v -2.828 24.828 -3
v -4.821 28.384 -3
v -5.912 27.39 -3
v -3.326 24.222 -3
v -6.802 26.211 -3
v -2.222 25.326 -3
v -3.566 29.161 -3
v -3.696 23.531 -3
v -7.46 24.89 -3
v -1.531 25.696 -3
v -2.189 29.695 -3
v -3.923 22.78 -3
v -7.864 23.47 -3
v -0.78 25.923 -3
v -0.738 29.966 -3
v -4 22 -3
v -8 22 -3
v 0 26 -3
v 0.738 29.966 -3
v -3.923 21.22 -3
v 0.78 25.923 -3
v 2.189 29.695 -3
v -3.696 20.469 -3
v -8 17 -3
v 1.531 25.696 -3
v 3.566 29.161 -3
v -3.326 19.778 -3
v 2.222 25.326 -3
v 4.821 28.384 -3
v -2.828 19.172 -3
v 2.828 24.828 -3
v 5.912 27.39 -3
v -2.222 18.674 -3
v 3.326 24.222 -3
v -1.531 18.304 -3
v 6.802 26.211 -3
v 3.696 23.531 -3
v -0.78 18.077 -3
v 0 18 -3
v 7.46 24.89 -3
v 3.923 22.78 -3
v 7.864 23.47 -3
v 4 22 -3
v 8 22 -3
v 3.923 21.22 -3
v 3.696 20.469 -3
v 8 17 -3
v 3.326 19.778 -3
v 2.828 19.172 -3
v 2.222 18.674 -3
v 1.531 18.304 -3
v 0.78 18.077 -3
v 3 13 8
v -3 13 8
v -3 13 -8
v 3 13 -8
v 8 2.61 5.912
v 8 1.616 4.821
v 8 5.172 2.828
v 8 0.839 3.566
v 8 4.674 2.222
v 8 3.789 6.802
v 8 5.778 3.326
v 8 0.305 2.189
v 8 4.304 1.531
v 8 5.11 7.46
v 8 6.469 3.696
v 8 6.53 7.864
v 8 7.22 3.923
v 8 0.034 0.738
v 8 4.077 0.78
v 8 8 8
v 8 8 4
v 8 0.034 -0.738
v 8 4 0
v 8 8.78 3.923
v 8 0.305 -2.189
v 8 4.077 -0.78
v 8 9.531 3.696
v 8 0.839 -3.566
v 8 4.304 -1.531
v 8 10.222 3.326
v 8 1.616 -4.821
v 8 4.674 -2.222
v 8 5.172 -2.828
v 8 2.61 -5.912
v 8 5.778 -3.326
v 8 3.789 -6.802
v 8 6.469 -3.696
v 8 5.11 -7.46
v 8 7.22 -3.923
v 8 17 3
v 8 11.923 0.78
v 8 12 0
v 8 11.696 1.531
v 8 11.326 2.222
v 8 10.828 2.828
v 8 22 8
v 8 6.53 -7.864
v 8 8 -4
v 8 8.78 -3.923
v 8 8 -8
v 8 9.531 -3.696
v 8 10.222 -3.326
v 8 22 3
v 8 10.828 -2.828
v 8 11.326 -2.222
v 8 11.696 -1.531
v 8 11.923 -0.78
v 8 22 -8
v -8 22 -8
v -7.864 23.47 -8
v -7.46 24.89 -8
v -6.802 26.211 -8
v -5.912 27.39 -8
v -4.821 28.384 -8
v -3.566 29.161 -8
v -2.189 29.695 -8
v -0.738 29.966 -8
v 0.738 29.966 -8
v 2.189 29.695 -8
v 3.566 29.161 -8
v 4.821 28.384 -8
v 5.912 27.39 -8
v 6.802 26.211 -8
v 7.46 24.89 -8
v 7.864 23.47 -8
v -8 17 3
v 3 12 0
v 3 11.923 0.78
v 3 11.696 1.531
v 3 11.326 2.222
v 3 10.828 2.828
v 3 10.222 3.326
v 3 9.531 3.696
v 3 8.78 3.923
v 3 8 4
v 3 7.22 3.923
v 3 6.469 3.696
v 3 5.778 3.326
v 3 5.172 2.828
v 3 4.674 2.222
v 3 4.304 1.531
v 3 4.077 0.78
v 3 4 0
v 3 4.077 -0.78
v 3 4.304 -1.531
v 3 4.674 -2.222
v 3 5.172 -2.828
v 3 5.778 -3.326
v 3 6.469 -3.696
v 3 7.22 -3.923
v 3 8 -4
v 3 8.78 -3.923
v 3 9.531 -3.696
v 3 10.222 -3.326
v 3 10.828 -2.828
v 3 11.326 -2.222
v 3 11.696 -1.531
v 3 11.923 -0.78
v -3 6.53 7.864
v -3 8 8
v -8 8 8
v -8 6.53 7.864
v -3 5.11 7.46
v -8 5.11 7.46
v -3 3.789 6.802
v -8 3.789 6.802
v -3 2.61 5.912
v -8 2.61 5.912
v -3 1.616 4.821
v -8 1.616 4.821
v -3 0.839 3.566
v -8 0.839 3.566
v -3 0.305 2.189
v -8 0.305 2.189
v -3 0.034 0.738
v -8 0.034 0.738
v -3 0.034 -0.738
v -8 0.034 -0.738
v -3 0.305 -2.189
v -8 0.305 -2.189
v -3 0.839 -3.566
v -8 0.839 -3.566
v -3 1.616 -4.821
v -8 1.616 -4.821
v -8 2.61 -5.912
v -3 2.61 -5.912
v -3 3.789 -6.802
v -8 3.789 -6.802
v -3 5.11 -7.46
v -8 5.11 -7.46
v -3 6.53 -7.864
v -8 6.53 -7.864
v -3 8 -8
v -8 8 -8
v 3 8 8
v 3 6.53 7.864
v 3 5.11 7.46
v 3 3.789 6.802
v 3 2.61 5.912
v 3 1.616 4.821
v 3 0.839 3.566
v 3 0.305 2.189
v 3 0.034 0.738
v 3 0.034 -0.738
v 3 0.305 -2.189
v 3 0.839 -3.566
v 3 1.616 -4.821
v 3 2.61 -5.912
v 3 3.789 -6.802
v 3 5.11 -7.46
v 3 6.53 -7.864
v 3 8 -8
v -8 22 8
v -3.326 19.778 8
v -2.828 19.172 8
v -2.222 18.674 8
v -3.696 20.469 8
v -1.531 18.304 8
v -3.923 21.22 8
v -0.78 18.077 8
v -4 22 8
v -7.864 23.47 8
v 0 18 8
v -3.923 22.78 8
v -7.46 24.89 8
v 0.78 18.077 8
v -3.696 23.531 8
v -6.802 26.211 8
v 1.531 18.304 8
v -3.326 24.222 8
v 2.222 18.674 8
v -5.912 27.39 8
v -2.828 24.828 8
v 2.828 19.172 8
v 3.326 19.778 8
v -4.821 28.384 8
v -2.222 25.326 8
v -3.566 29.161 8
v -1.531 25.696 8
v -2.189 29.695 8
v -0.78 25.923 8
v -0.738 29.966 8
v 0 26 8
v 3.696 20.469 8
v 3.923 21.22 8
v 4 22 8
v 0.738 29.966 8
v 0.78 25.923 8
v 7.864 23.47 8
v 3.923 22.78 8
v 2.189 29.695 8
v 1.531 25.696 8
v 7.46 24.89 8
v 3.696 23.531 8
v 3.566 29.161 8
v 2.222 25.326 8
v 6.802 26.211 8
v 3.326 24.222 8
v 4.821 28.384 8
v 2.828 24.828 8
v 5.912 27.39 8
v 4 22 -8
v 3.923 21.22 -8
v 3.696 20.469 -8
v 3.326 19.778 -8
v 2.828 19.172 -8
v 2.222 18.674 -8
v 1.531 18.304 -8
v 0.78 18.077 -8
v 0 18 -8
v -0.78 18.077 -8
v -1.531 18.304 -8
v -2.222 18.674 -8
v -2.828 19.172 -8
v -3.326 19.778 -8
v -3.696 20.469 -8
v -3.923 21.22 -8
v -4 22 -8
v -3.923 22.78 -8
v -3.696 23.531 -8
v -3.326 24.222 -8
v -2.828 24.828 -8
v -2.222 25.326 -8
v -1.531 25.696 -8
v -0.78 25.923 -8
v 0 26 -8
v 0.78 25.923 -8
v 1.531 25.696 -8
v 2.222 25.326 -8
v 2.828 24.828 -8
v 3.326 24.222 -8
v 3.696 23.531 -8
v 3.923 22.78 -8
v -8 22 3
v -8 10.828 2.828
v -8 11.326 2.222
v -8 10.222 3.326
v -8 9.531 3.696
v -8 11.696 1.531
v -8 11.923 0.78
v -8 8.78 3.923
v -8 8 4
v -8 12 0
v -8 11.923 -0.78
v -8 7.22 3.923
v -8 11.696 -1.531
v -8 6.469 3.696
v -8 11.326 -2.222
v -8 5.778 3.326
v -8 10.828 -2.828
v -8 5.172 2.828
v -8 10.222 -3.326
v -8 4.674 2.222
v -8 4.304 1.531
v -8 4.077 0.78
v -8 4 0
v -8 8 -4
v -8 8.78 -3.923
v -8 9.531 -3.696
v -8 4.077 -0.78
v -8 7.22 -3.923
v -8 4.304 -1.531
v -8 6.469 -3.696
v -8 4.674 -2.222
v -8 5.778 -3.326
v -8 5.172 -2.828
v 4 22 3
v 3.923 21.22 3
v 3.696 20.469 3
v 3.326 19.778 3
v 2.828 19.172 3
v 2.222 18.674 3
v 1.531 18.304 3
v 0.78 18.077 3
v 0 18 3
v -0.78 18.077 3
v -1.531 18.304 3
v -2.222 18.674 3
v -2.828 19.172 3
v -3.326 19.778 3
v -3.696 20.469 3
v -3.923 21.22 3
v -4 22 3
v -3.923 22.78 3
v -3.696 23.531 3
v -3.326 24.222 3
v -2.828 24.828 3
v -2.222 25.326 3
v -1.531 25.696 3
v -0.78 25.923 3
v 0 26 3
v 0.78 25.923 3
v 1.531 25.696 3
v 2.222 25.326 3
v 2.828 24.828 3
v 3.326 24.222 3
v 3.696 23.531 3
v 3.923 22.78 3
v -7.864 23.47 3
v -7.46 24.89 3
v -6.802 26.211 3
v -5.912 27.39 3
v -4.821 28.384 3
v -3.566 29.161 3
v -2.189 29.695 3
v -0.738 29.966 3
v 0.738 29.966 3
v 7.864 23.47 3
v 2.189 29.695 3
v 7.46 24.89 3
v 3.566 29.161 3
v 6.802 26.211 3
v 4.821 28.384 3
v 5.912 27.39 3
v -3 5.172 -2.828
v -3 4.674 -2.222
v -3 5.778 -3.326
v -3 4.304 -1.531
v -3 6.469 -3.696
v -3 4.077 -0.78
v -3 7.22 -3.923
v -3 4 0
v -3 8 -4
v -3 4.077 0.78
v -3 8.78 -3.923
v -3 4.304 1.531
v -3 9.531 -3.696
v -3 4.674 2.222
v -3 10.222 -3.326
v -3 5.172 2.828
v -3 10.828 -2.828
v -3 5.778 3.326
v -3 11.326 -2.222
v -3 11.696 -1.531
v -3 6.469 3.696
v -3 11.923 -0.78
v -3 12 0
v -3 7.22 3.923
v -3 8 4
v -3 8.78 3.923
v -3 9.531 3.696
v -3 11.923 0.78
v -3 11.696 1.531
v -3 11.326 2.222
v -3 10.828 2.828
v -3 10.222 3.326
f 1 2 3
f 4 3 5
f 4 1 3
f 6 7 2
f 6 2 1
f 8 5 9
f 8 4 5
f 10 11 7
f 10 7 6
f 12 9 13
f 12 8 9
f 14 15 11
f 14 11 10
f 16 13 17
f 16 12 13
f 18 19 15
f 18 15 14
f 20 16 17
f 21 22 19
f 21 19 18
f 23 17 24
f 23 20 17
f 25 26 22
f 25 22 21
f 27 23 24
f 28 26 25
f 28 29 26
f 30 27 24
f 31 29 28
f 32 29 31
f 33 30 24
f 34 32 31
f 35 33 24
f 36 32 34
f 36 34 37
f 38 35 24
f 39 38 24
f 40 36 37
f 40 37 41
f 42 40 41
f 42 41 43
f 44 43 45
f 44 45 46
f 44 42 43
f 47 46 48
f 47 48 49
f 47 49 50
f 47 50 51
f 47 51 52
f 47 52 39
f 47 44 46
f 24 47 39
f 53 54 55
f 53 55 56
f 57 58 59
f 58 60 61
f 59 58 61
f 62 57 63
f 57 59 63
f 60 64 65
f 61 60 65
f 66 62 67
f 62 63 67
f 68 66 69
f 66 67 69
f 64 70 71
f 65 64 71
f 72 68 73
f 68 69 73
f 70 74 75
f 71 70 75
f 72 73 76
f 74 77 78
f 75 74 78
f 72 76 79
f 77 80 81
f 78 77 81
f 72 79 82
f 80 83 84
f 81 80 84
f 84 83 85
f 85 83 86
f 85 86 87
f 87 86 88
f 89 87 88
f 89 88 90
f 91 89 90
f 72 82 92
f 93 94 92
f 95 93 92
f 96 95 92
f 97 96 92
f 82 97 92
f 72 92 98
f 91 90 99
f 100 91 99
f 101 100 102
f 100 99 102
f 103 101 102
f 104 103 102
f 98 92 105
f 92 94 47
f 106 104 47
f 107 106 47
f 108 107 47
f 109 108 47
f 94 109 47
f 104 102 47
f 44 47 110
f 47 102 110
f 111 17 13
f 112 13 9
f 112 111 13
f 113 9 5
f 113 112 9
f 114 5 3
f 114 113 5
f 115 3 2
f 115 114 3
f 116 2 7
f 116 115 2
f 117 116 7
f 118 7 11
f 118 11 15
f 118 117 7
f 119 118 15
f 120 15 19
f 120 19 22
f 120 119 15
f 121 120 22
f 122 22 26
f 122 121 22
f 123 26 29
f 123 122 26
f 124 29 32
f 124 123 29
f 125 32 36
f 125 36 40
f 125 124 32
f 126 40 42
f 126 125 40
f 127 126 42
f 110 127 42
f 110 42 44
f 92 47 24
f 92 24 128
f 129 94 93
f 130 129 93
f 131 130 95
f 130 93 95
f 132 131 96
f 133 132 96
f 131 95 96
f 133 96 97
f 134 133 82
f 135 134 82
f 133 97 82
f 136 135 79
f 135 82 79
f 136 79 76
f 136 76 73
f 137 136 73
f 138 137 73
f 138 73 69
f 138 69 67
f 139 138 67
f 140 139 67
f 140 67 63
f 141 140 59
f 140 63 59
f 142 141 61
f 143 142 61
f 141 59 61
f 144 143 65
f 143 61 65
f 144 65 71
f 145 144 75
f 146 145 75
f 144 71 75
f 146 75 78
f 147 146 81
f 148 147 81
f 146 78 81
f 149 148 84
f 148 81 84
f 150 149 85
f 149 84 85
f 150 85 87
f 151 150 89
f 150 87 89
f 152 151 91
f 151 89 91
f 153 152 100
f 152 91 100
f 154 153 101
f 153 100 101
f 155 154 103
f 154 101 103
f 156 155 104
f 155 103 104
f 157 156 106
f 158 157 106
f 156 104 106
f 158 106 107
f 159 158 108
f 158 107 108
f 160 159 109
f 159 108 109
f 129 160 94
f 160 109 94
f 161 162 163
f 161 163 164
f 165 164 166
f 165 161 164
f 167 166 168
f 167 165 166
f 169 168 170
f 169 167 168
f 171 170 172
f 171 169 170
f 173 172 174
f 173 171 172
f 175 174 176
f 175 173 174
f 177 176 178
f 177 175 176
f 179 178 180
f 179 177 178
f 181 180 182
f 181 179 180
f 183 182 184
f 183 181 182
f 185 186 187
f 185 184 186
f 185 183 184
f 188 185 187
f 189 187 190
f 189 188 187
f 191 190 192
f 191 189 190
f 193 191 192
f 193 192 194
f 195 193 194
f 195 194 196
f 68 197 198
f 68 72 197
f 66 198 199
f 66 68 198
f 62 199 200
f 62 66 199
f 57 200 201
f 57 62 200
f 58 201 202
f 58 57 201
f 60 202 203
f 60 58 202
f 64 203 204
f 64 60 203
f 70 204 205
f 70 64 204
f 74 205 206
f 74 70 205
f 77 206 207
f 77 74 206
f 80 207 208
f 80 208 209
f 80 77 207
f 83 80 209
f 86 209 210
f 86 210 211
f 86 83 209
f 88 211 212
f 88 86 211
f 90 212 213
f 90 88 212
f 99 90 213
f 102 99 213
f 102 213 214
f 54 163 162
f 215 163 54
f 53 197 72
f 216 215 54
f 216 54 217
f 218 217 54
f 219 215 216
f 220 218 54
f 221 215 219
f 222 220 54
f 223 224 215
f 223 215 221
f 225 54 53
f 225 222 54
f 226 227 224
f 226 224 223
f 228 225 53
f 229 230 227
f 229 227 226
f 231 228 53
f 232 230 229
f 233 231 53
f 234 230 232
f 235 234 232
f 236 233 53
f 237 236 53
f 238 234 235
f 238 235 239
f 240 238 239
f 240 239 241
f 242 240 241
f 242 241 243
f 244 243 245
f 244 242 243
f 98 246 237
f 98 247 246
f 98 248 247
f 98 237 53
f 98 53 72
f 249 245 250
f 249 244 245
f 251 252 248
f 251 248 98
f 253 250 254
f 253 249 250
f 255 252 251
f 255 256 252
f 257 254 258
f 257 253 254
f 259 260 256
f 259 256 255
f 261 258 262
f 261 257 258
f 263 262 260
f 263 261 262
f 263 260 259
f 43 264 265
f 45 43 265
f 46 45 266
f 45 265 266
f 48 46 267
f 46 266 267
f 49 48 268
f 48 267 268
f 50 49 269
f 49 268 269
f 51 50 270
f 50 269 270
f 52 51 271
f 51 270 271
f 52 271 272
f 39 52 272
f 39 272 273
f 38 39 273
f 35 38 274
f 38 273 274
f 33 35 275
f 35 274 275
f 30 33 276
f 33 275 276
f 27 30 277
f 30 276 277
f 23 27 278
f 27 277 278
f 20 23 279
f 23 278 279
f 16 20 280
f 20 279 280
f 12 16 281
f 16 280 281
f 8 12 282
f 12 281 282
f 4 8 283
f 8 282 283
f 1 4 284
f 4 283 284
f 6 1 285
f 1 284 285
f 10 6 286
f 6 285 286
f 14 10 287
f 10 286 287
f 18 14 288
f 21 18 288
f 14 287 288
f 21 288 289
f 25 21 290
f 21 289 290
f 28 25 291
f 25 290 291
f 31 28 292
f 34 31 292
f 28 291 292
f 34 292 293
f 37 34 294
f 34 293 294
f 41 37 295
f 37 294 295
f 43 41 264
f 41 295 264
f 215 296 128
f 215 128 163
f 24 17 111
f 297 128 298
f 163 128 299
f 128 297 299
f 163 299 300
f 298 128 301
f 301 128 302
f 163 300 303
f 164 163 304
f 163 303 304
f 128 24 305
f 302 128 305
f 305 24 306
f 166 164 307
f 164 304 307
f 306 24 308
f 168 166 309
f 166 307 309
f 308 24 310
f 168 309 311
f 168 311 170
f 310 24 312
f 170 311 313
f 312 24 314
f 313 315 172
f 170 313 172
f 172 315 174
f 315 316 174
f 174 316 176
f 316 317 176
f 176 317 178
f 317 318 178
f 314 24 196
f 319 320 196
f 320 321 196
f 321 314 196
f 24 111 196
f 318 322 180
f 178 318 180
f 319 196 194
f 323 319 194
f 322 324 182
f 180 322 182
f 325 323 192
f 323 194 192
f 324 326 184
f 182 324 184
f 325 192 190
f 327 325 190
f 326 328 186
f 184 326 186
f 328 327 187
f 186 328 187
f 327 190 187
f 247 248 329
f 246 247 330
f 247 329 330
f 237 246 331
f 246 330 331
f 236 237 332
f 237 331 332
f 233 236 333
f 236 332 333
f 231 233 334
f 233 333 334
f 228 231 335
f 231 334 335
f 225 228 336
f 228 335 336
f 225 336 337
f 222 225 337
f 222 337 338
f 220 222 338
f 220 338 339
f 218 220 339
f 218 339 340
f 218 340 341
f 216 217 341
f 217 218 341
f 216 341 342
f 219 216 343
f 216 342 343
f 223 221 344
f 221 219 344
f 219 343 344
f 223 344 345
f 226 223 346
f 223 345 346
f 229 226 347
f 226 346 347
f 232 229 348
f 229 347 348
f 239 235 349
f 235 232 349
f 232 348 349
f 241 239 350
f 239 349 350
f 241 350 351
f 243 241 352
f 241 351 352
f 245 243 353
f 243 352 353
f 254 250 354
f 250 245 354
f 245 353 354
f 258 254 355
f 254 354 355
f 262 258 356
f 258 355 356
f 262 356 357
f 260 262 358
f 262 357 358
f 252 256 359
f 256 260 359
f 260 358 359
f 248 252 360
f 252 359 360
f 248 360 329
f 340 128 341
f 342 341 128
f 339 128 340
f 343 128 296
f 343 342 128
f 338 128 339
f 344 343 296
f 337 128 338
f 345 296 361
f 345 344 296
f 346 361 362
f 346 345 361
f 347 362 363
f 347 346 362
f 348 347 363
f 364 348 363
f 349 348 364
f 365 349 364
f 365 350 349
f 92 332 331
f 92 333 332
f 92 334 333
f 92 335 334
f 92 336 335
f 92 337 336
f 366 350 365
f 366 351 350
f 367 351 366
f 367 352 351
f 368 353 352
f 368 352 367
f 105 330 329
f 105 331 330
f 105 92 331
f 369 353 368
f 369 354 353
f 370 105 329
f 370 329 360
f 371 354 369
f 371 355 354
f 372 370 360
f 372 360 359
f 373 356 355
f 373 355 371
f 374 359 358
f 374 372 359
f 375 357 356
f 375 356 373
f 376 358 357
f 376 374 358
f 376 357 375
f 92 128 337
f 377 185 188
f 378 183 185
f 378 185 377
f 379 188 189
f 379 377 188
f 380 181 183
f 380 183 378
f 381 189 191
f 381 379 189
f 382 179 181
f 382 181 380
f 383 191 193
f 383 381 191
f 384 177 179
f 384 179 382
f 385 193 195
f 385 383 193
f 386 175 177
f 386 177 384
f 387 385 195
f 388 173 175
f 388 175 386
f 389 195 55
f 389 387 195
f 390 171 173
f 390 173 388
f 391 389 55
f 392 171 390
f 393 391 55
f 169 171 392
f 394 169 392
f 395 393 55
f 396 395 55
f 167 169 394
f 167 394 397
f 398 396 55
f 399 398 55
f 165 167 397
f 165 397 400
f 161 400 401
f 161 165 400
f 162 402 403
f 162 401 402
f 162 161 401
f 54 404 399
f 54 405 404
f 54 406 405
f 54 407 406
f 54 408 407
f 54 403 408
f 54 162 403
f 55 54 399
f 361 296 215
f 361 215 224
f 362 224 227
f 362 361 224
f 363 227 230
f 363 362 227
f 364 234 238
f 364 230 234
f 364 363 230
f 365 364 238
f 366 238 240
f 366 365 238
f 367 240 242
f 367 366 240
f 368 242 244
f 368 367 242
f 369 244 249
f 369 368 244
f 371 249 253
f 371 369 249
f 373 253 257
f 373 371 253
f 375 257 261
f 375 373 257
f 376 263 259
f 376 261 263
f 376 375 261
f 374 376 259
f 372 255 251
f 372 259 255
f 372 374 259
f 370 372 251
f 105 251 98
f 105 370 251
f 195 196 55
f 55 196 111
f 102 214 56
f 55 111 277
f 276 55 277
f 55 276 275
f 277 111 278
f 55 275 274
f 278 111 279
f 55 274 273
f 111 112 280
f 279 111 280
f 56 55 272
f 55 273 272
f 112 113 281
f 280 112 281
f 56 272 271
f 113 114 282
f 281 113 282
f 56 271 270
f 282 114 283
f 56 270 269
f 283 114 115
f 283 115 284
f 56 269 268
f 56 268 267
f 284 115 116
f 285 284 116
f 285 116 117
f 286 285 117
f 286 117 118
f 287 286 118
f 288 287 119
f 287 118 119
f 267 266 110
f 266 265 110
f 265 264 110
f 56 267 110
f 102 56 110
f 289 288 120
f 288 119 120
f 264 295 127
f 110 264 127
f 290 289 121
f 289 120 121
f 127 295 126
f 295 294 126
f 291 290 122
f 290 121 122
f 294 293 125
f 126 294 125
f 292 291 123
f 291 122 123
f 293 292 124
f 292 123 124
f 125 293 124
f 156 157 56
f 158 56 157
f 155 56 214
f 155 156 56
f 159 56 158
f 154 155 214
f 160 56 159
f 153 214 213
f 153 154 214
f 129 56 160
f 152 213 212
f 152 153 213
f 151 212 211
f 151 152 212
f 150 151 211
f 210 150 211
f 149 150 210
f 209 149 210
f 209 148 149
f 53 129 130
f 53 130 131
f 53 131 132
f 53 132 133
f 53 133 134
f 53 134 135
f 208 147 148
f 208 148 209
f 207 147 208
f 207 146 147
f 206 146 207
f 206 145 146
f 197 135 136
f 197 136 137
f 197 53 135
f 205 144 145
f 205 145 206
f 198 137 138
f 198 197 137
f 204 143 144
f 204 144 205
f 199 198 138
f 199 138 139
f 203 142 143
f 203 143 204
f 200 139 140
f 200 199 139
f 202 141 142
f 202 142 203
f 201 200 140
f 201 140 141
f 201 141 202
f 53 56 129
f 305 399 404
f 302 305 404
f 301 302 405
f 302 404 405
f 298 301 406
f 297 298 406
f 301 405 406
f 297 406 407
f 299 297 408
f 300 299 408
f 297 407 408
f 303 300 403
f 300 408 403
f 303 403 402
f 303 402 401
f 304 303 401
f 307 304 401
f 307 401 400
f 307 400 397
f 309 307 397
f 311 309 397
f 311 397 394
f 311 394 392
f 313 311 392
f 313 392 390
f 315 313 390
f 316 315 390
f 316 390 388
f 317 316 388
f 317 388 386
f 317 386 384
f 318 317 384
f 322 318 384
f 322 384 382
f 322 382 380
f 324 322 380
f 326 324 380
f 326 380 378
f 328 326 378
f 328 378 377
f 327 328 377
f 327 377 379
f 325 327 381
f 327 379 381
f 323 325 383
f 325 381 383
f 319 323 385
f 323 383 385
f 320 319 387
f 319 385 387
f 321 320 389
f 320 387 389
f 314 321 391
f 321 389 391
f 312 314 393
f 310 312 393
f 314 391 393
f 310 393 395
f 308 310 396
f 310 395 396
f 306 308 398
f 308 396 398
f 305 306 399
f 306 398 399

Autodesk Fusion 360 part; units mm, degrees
sketch "草图1" plane through (0, 0, 0) normal (0, 0, 1) x (1, 0, 0)
  circle A0 centre (0, 22) radius 4
  circle A1 centre (0, 22) radius 8
  line L0 (-8, 22) -> (-8, 0)
  line L1 (-8, 0) -> (8, 0)
  line L2 (8, 0) -> (8, 22)
  line L3 (0, 108.3744) -> (0, -35) construction
  dimension "d1" = 8
  dimension "d2" = 16
  dimension "d3" = 22
extrude "拉伸1" add sketch "草图1" along normal mid plane 16
sketch "草图2" plane through (8, 0, 0) normal (1, 0, 0) x (0, 1, 0)
  line L0 (22, -8) -> (22, 8)
  line L1 (22, 8) -> (0, 8)
  line L2 (0, 8) -> (0, -8)
  line L3 (0, -8) -> (22, -8)
  circle A0 centre (8, 0) radius 8
  circle A1 centre (8, 0) radius 4
  line L4 (8, 8) -> (22, 8)
  line L5 (22, 8) -> (22, -8)
  line L6 (8, -8) -> (22, -8)
  line L7 (-6, 0) -> (34.5187, 0) construction
  dimension "d6" = 16
  dimension "d7" = 8
  dimension "d8" = 14
extrude "拉伸2" cut sketch "草图2" against normal blind 52 contours L2 L3 A0 | L1 L2 A0 | A1
sketch "草图3" plane through (8, 0, 0) normal (1, 0, 0) x (0, 1, 0)
  circle A0 centre (8, 0) radius 4
  arc A1 (8, 8) -> (8, -8) centre (8, 0) ccw
  line L0 (8, -8) -> (22, -8)
  line L1 (22, -8) -> (22, 8)
  line L2 (22, 8) -> (8, 8)
  line L3 (17, 3) -> (30, 3)
  line L4 (30, 3) -> (30, -3)
  line L5 (30, -3) -> (17, -3)
  line L6 (17, -3) -> (17, 3)
  line L7 (-4, 0) -> (38.4958, 0) construction
  line L8 (30, 8) -> (30, -8) construction
  dimension "d11" = 6
  dimension "d12" = 13
extrude "拉伸3" cut sketch "草图3" against normal blind 21 contours L1 L3 L4 L5 | L1 L3 L5 L6
sketch "草图4" plane through (0, 0, 8) normal (0, 0, 1) x (-1, 0, 0)
  line L0 (8, -8) -> (-8, -8)
  line L1 (-8, -8) -> (-8, -22)
  arc A0 (-8, -22) -> (8, -22) centre (0, -22) ccw
  line L2 (8, -22) -> (8, -8)
  circle A1 centre (0, -22) radius 4
  line L3 (-3, 0) -> (3, 0)
  line L4 (3, 0) -> (3, -13)
  line L5 (3, -13) -> (-3, -13)
  line L6 (-3, -13) -> (-3, 0)
  line L7 (0, 5) -> (0, -37) construction
  line L8 (-8, 0) -> (8, 0) construction
  dimension "d15" = 6
  dimension "d16" = 13
extrude "拉伸4" cut sketch "草图4" against normal blind 68 contours L0 L4 L5 L6 | L0 L3 L4 L6
